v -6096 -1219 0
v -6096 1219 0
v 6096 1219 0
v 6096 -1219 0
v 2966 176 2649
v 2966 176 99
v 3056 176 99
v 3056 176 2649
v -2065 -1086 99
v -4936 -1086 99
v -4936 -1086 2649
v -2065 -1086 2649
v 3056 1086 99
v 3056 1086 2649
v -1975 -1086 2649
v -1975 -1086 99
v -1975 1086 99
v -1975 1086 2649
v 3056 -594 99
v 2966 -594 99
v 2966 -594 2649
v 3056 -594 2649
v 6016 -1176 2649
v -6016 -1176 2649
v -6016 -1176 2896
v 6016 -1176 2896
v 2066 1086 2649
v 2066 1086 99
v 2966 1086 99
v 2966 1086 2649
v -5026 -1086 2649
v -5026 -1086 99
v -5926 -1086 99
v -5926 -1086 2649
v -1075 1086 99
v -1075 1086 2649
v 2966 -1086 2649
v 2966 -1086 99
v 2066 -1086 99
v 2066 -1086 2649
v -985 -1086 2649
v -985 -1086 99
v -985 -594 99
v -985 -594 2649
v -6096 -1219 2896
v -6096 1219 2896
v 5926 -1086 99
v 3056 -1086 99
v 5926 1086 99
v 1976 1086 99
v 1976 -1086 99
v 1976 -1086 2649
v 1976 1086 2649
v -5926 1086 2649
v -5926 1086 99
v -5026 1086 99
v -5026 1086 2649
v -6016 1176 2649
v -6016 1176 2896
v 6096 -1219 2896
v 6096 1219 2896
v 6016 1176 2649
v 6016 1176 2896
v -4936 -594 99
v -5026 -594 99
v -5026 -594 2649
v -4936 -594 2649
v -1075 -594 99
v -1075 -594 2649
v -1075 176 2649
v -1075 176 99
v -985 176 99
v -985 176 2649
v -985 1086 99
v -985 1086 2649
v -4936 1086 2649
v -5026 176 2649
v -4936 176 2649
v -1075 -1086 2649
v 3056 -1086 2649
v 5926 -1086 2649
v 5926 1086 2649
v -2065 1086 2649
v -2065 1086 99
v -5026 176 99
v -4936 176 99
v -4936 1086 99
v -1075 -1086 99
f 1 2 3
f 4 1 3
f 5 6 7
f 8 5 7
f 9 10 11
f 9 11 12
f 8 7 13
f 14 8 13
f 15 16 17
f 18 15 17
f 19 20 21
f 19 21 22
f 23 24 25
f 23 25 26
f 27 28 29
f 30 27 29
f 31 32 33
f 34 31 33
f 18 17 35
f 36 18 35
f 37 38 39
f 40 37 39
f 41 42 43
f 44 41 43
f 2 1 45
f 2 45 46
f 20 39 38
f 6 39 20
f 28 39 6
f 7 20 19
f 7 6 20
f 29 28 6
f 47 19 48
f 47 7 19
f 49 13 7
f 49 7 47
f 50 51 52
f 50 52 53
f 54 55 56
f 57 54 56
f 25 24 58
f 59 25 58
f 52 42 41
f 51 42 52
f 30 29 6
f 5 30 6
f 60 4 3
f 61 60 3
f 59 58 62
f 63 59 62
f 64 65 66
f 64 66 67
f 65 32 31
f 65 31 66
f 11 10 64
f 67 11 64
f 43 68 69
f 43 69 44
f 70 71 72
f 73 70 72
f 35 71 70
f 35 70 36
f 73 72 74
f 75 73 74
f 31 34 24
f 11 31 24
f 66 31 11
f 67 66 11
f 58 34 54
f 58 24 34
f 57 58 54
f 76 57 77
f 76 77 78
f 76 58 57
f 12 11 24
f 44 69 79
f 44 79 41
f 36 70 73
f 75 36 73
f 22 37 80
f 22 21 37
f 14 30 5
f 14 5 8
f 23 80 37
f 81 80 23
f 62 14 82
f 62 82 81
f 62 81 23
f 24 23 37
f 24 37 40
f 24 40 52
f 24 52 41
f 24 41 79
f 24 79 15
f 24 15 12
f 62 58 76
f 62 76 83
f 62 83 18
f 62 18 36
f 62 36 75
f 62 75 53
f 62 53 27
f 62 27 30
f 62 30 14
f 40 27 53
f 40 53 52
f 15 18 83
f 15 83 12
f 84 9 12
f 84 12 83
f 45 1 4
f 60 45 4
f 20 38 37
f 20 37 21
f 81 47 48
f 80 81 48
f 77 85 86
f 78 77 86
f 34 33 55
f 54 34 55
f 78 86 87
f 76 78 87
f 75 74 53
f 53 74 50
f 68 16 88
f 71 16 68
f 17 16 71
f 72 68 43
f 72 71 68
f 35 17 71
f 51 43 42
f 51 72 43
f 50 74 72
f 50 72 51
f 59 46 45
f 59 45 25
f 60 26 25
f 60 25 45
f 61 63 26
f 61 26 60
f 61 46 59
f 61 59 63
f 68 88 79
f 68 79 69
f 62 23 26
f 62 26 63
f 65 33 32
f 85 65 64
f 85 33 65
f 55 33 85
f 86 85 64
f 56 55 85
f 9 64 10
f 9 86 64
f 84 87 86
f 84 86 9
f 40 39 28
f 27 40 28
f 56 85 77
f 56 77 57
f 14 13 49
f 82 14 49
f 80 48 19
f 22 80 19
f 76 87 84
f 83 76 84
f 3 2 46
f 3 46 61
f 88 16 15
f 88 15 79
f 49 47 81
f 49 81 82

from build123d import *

# Parameters (mm, degrees)
F0_W     = 12192
F0_H     = 2438
F0_W_2   = 12032
F0_H_2   = 2352
F1_DEPTH = 2896
F2_DEPTH = 99
F3_W     = 90
F3_H     = 90
F3_W_2   = 2871
F3_H_2   = 910
F3_H_3   = 2172
F3_H_4   = 492
F3_W_3   = 900
F3_W_4   = 2961
F4_DEPTH = 2550


with BuildPart() as f1:
    # F0 (on Top) → F1 (new body)
    with BuildSketch(Plane.XY):
        Rectangle(F0_W, F0_H)
        Rectangle(F0_W_2, F0_H_2, mode=Mode.SUBTRACT)
    extrude(amount=F1_DEPTH)

    # F0 (on Top) → F2 (join)
    with BuildSketch(Plane.XY):
        Rectangle(F0_W_2, F0_H_2)
    extrude(amount=F2_DEPTH)

    # F3 (on face) → F4 (join)
    with BuildSketch(Plane.XY.offset(99)):
        Polygon((-5026, 1086), (-5026, 1176), (-6016, 1176), (-6016, 1086), (-5926, 1086), align=None)
        with Locations((-4981, 1131)):
            Rectangle(F3_W, F3_H)
        with Locations((-3500.5, 1131)):
            Rectangle(F3_W_2, F3_H)
        with Locations((-4981, 631)):
            Rectangle(F3_W, F3_H_2)
        with Locations((-5971, 0)):
            Rectangle(F3_W, F3_H_3)
        Polygon((-5026, -1176), (-5026, -1086), (-5926, -1086), (-6016, -1086), (-6016, -1176), align=None)
        with Locations((-4981, -840)):
            Rectangle(F3_W, F3_H_4)
        with Locations((-4981, -1131)):
            Rectangle(F3_W, F3_H)
        with Locations((-3500.5, -1131)):
            Rectangle(F3_W_2, F3_H)
        with Locations((-2020, 0)):
            Rectangle(F3_W, F3_H_3)
        with Locations((-2020, 1131)):
            Rectangle(F3_W, F3_H)
        with Locations((-1525, 1131)):
            Rectangle(F3_W_3, F3_H)
        with Locations((-1030, 1131)):
            Rectangle(F3_W, F3_H)
        with Locations((495.5, 1131)):
            Rectangle(F3_W_4, F3_H)
        with Locations((-1030, 631)):
            Rectangle(F3_W, F3_H_2)
        with Locations((-1525, -1131)):
            Rectangle(F3_W_3, F3_H)
        with Locations((-2020, -1131)):
            Rectangle(F3_W, F3_H)
        with Locations((-1030, -840)):
            Rectangle(F3_W, F3_H_4)
        with Locations((-1030, -1131)):
            Rectangle(F3_W, F3_H)
        with Locations((495.5, -1131)):
            Rectangle(F3_W_4, F3_H)
        with Locations((2021, 0)):
            Rectangle(F3_W, F3_H_3)
        with Locations((2021, 1131)):
            Rectangle(F3_W, F3_H)
        with Locations((2021, -1131)):
            Rectangle(F3_W, F3_H)
        with Locations((2516, -1131)):
            Rectangle(F3_W_3, F3_H)
        with Locations((3011, -1131)):
            Rectangle(F3_W, F3_H)
        Polygon((5926, -1086), (3056, -1086), (3056, -1176), (6016, -1176), (6016, -1086), align=None)
        with Locations((3011, -840)):
            Rectangle(F3_W, F3_H_4)
        with Locations((3011, 631)):
            Rectangle(F3_W, F3_H_2)
        with Locations((3011, 1131)):
            Rectangle(F3_W, F3_H)
        with Locations((2516, 1131)):
            Rectangle(F3_W_3, F3_H)
        Polygon((6016, 1176), (3056, 1176), (3056, 1086), (5926, 1086), (6016, 1086), align=None)
        with Locations((5971, 0)):
            Rectangle(F3_W, F3_H_3)
    extrude(amount=F4_DEPTH)


solid = f1.part
